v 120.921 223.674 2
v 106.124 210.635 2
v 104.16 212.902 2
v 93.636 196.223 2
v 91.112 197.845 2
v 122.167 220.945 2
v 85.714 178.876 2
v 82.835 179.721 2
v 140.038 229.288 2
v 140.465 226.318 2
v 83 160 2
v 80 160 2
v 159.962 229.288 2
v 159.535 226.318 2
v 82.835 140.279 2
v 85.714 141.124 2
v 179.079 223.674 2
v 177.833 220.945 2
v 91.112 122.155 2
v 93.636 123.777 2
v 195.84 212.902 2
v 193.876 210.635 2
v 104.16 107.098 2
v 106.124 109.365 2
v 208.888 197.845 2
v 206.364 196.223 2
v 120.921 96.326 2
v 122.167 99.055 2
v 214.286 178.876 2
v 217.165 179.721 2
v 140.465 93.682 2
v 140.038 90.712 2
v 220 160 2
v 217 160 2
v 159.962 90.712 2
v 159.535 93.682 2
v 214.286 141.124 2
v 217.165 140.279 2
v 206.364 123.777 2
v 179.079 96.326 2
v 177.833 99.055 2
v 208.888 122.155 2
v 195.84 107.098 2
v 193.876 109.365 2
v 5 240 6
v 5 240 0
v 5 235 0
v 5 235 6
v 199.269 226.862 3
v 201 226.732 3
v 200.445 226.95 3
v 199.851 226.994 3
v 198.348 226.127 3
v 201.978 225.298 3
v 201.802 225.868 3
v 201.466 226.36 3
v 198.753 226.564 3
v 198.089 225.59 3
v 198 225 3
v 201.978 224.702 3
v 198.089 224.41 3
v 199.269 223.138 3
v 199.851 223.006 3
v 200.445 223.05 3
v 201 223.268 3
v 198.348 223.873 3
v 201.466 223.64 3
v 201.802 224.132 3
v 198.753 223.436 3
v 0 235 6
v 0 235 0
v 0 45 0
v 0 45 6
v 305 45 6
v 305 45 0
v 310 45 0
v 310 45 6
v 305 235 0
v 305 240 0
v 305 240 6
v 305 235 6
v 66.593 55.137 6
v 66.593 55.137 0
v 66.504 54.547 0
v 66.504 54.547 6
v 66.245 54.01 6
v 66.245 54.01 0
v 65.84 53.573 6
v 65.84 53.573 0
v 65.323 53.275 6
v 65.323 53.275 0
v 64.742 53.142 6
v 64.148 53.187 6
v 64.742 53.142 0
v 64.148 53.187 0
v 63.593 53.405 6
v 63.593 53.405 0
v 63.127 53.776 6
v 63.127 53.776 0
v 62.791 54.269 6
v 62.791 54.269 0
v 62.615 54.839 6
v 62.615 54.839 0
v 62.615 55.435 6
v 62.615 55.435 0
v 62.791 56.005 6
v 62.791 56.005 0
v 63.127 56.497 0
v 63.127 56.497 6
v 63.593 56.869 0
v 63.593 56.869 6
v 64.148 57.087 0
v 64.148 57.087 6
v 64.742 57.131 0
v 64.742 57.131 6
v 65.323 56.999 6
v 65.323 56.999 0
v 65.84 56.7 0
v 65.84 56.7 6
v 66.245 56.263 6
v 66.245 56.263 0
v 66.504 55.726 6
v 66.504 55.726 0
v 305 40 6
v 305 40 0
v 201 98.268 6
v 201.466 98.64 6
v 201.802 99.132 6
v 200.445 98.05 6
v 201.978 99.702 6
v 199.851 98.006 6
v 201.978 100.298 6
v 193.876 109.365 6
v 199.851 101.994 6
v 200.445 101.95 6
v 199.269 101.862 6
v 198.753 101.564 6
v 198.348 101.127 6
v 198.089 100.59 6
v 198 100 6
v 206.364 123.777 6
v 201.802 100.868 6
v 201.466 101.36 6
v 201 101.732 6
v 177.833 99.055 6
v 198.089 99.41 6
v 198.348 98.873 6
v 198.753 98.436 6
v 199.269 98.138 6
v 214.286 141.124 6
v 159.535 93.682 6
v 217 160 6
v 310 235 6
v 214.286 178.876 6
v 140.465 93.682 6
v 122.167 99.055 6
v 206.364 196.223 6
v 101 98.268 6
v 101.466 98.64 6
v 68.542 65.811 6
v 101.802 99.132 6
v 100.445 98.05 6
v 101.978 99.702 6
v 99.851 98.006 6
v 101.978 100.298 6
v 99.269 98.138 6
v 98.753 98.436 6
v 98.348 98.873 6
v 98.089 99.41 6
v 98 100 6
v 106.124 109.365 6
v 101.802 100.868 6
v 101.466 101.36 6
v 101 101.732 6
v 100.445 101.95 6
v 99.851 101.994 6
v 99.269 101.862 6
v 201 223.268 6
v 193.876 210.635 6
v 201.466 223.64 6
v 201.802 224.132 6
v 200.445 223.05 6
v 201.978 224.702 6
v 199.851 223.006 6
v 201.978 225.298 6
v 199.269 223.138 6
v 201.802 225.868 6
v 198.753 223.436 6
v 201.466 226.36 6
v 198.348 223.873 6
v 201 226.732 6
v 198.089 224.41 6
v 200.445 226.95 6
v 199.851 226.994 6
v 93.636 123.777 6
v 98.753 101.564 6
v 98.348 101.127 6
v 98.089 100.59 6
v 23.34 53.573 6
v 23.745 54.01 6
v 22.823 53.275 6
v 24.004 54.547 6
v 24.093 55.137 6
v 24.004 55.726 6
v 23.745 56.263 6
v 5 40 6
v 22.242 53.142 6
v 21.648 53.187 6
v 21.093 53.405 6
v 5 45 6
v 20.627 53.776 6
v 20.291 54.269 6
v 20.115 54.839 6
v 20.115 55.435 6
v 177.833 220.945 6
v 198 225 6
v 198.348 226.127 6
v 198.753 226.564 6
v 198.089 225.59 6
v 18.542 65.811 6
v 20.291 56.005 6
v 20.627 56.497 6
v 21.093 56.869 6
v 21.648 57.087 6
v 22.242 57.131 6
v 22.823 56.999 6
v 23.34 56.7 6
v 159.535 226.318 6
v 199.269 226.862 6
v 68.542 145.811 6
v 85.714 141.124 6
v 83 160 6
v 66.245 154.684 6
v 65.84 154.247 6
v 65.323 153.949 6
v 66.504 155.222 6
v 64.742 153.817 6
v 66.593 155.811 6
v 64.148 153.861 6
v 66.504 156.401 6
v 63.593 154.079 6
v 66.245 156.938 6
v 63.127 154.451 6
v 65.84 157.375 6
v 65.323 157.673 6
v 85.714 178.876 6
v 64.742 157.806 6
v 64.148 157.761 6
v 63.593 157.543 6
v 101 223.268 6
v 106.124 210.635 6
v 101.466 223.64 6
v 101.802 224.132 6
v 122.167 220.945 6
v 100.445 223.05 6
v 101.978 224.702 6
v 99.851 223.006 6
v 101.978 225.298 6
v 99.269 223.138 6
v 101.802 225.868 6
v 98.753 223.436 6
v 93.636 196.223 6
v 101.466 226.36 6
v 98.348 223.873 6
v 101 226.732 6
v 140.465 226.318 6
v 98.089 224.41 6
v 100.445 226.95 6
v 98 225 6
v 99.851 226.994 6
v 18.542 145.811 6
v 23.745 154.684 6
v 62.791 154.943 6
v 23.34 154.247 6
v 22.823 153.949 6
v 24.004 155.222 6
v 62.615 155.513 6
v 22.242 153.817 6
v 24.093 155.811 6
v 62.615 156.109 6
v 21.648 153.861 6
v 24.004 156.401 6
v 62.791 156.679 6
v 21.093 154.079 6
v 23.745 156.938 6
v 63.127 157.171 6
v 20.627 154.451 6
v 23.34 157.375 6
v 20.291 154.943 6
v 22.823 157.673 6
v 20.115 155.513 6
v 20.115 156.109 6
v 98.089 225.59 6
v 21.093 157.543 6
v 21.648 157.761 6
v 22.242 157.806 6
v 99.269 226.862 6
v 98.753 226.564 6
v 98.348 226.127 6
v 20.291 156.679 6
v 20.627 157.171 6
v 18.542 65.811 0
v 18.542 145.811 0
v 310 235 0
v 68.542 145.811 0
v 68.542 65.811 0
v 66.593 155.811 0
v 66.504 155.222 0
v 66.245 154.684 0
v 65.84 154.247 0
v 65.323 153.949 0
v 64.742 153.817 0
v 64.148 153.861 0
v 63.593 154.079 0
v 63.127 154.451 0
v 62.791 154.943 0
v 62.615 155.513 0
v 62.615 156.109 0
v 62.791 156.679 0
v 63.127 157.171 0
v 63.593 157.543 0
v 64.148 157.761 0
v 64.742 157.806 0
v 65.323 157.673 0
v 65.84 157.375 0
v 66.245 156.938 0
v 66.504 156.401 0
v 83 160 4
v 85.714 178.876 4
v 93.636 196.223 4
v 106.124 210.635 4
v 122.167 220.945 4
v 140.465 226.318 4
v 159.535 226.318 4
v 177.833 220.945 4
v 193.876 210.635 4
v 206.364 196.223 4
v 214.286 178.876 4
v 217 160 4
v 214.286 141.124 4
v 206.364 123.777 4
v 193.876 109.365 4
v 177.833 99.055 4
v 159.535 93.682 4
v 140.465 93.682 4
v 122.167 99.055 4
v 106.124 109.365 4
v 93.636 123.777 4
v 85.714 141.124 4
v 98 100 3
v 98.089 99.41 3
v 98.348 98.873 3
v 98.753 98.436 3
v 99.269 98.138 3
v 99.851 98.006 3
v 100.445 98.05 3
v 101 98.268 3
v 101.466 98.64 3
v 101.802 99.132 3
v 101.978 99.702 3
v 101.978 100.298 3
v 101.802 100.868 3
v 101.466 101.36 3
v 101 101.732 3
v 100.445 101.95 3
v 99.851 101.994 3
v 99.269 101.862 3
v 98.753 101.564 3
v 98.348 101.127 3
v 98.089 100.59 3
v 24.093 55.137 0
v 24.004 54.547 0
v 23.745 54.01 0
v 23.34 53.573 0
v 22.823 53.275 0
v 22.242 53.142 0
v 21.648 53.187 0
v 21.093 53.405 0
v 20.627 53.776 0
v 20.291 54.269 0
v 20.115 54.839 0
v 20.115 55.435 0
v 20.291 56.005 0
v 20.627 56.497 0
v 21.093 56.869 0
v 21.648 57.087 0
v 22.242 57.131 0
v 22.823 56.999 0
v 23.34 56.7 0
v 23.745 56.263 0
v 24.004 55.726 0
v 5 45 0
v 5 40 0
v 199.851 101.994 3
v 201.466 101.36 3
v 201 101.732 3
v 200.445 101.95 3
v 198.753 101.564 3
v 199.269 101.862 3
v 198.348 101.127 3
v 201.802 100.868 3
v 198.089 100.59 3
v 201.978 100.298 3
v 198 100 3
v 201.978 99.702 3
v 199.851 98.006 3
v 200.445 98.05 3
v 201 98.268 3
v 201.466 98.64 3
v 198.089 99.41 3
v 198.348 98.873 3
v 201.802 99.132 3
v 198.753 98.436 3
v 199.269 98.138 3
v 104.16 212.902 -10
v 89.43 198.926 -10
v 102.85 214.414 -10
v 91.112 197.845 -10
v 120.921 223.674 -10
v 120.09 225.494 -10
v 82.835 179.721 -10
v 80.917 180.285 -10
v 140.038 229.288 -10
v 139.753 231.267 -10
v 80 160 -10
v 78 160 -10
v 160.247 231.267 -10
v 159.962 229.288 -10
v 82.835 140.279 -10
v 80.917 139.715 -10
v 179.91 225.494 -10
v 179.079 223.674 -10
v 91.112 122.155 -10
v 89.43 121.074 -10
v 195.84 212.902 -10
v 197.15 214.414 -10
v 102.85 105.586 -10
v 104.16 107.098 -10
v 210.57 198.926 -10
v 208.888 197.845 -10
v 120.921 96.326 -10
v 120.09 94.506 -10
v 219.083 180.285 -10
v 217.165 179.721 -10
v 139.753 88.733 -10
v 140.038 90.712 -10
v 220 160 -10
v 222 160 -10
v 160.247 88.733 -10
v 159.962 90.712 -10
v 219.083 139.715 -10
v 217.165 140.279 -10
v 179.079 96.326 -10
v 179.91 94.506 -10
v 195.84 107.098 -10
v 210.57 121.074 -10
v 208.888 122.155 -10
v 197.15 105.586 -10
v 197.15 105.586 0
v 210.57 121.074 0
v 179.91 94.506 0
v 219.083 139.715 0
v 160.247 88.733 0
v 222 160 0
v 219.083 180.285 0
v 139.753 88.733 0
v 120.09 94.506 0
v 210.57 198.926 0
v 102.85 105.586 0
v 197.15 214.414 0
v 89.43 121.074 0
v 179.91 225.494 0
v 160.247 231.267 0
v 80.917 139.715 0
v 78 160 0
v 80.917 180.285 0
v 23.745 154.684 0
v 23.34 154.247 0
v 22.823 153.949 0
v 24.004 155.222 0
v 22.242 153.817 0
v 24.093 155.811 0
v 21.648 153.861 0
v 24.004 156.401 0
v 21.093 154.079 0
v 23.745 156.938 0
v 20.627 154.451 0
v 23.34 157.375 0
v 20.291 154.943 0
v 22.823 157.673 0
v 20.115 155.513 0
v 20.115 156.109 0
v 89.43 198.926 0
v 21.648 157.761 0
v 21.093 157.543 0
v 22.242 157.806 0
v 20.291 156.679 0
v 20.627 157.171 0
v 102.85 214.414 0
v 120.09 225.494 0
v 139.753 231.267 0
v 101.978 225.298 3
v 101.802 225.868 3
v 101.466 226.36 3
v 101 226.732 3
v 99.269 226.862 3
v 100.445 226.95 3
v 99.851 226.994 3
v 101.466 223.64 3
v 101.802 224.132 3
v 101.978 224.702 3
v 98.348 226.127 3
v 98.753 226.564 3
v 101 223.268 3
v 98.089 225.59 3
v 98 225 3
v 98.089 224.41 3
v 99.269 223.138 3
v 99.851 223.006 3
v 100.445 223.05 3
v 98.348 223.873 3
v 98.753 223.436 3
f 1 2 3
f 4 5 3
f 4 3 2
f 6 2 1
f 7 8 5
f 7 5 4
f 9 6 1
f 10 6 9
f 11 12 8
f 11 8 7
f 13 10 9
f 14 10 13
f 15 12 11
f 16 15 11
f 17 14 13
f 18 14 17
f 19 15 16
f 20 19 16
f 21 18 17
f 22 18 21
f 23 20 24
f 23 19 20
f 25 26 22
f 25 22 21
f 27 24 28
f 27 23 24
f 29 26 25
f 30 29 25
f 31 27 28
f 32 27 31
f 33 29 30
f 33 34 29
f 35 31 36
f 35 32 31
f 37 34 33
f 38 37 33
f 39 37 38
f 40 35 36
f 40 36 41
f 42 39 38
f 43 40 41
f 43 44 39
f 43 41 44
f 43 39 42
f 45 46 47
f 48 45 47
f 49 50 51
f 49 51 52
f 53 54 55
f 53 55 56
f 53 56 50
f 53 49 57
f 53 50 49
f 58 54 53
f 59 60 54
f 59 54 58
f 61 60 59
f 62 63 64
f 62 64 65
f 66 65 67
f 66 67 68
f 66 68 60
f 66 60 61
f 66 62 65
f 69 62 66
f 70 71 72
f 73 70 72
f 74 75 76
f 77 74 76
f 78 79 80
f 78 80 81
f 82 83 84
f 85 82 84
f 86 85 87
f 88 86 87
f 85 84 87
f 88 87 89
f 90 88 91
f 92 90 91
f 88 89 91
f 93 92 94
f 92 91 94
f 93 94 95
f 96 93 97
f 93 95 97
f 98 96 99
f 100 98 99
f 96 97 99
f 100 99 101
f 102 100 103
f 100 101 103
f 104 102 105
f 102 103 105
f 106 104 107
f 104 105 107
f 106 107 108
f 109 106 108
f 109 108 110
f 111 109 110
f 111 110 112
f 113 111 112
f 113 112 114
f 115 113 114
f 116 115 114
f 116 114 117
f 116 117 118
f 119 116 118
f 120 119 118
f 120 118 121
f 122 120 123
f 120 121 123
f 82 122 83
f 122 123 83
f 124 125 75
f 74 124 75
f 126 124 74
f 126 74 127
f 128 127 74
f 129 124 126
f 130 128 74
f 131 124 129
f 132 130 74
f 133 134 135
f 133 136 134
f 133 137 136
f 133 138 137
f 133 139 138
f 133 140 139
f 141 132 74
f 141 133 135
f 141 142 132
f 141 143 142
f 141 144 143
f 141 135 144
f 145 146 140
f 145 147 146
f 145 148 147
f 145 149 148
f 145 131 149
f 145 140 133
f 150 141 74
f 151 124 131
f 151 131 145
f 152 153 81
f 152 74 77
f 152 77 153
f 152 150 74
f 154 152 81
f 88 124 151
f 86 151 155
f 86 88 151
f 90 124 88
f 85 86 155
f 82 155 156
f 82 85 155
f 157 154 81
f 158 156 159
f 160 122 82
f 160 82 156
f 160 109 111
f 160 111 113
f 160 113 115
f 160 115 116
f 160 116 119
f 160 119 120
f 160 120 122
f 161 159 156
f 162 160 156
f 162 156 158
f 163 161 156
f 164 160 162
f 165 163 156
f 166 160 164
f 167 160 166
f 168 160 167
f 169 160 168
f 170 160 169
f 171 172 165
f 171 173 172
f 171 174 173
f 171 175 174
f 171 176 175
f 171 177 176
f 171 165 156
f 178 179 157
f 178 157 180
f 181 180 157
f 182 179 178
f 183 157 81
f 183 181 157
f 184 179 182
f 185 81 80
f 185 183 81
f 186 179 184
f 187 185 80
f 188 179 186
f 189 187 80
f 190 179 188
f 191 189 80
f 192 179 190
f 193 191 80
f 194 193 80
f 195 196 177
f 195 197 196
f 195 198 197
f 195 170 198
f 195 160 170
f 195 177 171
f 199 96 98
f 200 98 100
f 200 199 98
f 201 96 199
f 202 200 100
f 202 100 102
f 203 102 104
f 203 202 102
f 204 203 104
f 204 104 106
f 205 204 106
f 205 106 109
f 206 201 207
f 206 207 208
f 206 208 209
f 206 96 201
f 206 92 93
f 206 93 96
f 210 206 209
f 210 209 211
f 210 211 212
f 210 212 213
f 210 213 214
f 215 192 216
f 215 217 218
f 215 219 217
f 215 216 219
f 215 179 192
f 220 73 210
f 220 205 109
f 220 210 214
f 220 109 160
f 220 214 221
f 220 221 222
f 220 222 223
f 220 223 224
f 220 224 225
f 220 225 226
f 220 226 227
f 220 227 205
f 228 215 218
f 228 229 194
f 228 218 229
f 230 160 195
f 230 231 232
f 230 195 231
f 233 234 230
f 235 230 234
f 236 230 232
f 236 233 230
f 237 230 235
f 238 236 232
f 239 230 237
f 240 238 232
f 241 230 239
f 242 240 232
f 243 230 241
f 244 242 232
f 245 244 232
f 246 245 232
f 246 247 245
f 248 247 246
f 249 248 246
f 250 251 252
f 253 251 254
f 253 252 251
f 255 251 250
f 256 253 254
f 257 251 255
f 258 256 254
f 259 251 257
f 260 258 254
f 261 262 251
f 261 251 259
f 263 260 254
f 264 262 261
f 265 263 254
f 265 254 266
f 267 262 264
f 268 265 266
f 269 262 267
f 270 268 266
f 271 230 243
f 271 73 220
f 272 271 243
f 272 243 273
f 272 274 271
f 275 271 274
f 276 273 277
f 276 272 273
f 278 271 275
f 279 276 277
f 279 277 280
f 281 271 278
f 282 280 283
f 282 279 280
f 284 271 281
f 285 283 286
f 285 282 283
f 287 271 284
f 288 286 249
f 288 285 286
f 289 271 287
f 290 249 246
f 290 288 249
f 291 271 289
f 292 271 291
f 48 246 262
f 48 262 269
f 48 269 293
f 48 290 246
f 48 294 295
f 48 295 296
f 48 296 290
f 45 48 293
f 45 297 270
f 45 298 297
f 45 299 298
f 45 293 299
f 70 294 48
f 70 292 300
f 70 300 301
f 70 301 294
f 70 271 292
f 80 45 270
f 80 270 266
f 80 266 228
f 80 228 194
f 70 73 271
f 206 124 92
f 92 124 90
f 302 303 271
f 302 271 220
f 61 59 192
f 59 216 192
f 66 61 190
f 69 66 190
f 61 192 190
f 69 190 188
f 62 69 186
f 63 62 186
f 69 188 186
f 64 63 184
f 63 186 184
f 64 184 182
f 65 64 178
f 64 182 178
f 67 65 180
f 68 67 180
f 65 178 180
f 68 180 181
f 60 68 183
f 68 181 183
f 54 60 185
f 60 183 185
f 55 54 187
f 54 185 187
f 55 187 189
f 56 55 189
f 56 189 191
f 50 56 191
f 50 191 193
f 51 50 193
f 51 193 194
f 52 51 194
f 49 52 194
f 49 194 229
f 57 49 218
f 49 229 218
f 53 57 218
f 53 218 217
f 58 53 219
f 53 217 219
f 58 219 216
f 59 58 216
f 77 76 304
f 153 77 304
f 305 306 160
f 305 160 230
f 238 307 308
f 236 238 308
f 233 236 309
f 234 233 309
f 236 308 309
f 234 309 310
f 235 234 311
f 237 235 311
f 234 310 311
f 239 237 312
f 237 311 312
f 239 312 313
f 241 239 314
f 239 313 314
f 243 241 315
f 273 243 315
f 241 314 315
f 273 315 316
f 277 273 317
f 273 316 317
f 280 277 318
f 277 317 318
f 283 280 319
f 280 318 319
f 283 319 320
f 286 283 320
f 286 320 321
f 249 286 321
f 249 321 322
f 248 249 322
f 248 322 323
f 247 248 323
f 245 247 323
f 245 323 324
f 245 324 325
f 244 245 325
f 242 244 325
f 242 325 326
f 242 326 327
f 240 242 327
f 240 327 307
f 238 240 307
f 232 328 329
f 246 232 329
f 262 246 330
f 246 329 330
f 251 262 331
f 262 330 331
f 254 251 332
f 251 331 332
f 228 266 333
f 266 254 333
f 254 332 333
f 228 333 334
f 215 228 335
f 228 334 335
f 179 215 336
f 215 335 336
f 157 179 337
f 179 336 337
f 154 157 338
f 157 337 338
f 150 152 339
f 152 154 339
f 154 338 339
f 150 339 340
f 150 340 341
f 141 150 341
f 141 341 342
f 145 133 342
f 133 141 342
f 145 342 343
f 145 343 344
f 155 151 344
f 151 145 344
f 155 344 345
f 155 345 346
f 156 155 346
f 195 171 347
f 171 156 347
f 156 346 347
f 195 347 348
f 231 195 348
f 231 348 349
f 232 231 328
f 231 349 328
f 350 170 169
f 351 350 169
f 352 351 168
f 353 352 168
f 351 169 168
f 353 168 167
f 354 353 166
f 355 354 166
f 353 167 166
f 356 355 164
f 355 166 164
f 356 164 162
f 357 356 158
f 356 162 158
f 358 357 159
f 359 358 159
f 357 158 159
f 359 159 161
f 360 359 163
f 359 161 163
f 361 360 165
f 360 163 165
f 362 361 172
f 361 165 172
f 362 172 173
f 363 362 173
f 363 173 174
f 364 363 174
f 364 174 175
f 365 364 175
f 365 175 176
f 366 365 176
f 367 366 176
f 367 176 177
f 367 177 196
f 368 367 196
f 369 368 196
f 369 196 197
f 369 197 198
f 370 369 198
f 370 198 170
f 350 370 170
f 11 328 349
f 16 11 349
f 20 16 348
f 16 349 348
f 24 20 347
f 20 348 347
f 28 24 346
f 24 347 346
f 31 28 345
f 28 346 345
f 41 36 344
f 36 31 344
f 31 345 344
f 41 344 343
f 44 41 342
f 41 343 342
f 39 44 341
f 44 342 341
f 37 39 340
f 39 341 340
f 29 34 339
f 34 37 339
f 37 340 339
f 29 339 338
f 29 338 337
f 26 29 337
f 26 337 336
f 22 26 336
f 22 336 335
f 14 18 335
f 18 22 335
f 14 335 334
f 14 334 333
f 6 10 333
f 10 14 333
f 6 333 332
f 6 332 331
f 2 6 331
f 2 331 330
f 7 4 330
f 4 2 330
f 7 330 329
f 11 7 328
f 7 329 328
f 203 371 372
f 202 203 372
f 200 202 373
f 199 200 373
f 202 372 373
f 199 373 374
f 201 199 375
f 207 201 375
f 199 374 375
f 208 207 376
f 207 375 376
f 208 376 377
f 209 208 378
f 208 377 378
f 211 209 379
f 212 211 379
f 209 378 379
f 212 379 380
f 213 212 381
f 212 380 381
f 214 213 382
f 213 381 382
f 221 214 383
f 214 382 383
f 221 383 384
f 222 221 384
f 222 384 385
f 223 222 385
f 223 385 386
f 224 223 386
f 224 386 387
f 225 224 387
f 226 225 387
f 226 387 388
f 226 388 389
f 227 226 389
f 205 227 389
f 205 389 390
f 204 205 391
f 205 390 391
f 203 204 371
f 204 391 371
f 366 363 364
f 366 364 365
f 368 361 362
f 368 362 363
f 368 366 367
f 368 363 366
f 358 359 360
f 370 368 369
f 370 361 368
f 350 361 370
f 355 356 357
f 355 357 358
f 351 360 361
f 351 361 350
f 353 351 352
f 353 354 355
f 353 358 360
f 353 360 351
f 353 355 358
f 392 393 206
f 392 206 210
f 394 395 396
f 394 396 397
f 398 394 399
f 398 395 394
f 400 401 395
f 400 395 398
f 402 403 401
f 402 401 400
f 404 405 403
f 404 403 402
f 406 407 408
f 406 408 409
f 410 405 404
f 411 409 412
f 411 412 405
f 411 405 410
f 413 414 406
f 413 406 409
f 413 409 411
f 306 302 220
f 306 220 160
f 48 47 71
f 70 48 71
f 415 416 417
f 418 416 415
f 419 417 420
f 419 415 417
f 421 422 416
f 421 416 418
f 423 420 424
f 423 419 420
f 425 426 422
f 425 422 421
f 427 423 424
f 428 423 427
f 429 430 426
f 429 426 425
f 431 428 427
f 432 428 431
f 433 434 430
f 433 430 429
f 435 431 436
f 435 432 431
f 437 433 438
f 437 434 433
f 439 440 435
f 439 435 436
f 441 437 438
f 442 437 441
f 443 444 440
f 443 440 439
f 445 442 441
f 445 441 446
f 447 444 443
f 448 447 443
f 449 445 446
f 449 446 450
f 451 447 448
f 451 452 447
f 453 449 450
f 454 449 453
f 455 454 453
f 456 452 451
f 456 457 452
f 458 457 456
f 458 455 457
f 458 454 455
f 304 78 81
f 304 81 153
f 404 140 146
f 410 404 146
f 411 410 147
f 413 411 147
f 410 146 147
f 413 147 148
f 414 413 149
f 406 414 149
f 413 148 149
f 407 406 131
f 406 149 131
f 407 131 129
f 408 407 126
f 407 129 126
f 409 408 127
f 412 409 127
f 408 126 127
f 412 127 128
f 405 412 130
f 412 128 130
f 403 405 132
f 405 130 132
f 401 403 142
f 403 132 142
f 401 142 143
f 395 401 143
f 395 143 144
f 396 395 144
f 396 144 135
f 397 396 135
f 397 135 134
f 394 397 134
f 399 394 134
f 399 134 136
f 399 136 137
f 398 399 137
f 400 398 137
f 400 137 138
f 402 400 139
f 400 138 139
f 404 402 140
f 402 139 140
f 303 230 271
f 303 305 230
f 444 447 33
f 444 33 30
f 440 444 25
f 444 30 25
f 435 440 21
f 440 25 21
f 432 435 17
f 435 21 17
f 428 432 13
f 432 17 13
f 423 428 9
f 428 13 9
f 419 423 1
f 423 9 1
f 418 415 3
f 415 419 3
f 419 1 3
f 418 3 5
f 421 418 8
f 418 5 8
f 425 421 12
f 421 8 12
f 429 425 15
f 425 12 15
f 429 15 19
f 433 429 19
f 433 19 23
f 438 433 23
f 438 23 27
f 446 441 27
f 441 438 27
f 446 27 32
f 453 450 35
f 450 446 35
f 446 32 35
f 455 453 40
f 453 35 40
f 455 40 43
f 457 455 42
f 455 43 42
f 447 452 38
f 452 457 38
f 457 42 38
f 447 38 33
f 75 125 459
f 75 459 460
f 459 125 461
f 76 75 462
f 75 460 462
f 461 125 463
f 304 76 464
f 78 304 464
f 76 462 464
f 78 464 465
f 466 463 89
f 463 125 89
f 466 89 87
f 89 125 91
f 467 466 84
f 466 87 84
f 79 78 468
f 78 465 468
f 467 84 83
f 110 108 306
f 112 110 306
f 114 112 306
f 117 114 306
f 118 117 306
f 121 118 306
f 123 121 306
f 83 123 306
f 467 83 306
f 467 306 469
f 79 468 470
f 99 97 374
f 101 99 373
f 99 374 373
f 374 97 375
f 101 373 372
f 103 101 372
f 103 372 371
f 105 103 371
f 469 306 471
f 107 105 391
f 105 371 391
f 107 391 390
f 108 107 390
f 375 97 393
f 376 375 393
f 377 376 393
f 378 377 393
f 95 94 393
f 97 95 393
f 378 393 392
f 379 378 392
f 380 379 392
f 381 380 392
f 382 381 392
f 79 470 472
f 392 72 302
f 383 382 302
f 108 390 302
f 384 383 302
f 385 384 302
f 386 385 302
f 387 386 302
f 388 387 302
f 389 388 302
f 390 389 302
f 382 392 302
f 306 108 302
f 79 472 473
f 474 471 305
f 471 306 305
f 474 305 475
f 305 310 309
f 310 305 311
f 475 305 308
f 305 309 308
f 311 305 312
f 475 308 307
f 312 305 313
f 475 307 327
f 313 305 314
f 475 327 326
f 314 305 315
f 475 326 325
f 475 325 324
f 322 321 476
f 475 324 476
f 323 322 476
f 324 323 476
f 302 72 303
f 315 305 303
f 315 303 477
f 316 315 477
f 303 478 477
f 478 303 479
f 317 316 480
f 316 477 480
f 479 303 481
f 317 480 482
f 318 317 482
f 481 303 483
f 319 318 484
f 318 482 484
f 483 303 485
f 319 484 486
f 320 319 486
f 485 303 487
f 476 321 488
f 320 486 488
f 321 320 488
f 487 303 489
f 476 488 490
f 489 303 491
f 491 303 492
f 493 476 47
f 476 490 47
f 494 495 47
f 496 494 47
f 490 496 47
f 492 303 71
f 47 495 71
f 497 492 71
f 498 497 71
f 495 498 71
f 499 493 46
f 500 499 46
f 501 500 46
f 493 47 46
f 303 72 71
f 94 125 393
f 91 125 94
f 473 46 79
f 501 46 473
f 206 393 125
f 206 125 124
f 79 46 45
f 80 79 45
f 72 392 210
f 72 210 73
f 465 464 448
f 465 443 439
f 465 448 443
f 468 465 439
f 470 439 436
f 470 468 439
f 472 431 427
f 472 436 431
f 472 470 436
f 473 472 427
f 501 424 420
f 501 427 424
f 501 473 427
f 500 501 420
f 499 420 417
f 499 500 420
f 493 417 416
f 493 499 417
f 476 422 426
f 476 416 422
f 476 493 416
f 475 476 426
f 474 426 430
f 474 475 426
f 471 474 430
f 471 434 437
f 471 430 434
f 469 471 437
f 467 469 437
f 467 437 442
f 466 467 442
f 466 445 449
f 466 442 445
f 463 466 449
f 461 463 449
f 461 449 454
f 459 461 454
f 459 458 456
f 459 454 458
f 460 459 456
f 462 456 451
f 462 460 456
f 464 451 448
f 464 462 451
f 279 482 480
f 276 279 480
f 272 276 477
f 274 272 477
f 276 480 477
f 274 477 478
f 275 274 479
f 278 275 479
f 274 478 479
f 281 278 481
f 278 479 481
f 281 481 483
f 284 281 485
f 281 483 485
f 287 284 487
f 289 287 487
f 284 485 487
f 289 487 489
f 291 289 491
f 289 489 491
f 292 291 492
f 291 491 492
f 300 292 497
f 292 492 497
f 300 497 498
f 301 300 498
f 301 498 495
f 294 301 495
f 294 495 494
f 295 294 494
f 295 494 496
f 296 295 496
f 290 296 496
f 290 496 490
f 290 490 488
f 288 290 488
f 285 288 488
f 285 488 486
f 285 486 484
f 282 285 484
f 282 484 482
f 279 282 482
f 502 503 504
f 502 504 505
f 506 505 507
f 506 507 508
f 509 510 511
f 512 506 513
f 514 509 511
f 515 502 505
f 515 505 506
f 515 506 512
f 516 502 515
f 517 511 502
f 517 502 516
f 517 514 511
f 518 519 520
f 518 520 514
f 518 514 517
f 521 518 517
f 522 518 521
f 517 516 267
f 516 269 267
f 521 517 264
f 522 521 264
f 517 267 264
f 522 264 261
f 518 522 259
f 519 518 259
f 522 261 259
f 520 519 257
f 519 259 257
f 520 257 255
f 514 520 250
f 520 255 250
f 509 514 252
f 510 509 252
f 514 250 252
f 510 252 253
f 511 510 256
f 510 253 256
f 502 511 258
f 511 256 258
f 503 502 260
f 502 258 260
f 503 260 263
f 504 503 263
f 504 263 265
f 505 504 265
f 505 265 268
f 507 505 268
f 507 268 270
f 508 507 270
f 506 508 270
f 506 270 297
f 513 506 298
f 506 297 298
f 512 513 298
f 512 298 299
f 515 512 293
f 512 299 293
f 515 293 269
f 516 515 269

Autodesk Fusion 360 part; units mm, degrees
sketch "Skizze1" plane through (0, 0, 0) normal (0, 0, 1) x (1, 0, 0)
  line L0 (0, 0) -> (240, 0)
  line L1 (240, 0) -> (240, 240)
  line L2 (240, 240) -> (0, 240)
  line L3 (0, 240) -> (0, 0)
  dimension "d1" = 240
  dimension "d2" = 240
extrude "Extrusion1" add sketch "Skizze1" along normal blind 6
sketch "Skizze2" plane through (0, 0, 6) normal (0, 0, 1) x (-1, 0, 0)
  line L0 (0, -240) -> (0, 0)
  line L1 (0, 0) -> (-240, 0)
  line L2 (-240, 0) -> (-240, -240)
  line L3 (-240, -240) -> (0, -240)
  circle A0 centre (-150, -160) radius 70
  dimension "d6" = 140
extrude "Extrusion2" cut sketch "Skizze2" against normal blind 2 contours A0
sketch "Skizze3" plane through (0, 0, 4) normal (0, 0, 1) x (-1, 0, 0)
  circle A0 centre (-150, -160) radius 70
  circle A1 centre (-150, -160) radius 67
  dimension "d9" = 134
extrude "Extrusion3" cut sketch "Skizze3" against normal blind 35 contours A1
extrude "Extrusion4" add 1 faces at (208.7542, 124.1511, 4) along direction (0, 0, 1) blind 2
sketch "Skizze4" plane through (0, 0, 0) normal (0, 0, -1) x (1, 0, 0)
  circle A0 centre (150, -160) radius 67
  line L0 (0, 0) -> (0, -240)
  line L1 (0, -240) -> (240, -240)
  line L2 (240, -240) -> (240, 0)
  line L3 (240, 0) -> (0, 0)
  circle A1 centre (150, -160) radius 70
  dimension "d14" = 140
extrude "Extrusion5" cut sketch "Skizze4" against normal blind 2 contours A1
extrude "Extrusion6" cut 1 faces at (80, 0, 2) along direction (0, 1, 0) blind 40
sketch "Skizze5" plane through (0, 0, 0) normal (0, 0, -1) x (1, 0, 0)
  line L0 (240, -40) -> (0, -40)
  line L1 (0, -40) -> (0, -240)
  line L2 (0, -240) -> (240, -240)
  line L3 (240, -240) -> (240, -40)
  circle A0 centre (150, -160) radius 70
  circle A1 centre (150, -160) radius 70
  circle A2 centre (150, -160) radius 72
  dimension "d19" = 144
extrude "Extrusion7" add sketch "Skizze5" along normal blind 10 contours A2
extrude "Extrusion8" add 1 faces at (240, 106.6667, 4) along direction (1, 0, 0) blind 70
sketch "Skizze6" plane through (0, 0, 0) normal (0, 0, -1) x (1, 0, 0)
  circle A0 centre (150, -160) radius 72
  line L0 (310, -40) -> (0, -40)
  line L1 (0, -40) -> (0, -240)
  line L2 (0, -240) -> (310, -240)
  line L3 (310, -240) -> (310, -40)
  line L4 (0, -40) -> (5, -40)
  line L5 (5, -40) -> (5, -45)
  line L6 (5, -45) -> (0, -45)
  line L7 (0, -45) -> (0, -40)
  line L8 (0, -240) -> (5, -240)
  line L9 (5, -240) -> (5, -235)
  line L10 (5, -235) -> (0, -235)
  line L11 (0, -235) -> (0, -240)
  line L12 (310, -240) -> (305, -240)
  line L13 (305, -240) -> (305, -235)
  line L14 (305, -235) -> (310, -235)
  line L15 (310, -235) -> (310, -240)
  line L16 (310, -40) -> (305, -40)
  line L17 (305, -40) -> (305, -45)
  line L18 (305, -45) -> (310, -45)
  line L19 (310, -45) -> (310, -40)
  dimension "d24" = 5
  dimension "d25" = 5
extrude "Extrusion9" cut sketch "Skizze6" against normal blind 20 contours L0 L3 L16 L17 L18 L19 | L0 L1 L4 L5 L6 L7 | L2 L3 L12 L13 L14 L15 | L1 L2 L8 L9 L10 L11
sketch "Skizze7" plane through (0, 0, 0) normal (0, 0, -1) x (1, 0, 0)
  circle A0 centre (150, -160) radius 72
  line L0 (305, -240) -> (305, -235)
  line L1 (305, -235) -> (310, -235)
  line L2 (310, -235) -> (310, -45)
  line L3 (310, -45) -> (305, -45)
  line L4 (305, -45) -> (305, -40)
  line L5 (305, -40) -> (5, -40)
  line L6 (5, -40) -> (5, -45)
  line L7 (5, -45) -> (0, -45)
  line L8 (0, -45) -> (0, -235)
  line L9 (0, -235) -> (5, -235)
  line L10 (5, -235) -> (5, -240)
  line L11 (5, -240) -> (305, -240)
  line L12 (18.5416, -65.8113) -> (68.5416, -65.8113)
  line L13 (68.5416, -65.8113) -> (68.5416, -145.8113)
  line L14 (68.5416, -145.8113) -> (18.5416, -145.8113)
  line L15 (18.5416, -145.8113) -> (18.5416, -65.8113)
  circle A1 centre (64.5928, -155.8111) radius 2
  circle A2 centre (22.0928, -155.8111) radius 2
  circle A3 centre (64.5928, -55.1368) radius 2
  circle A4 centre (22.0928, -55.1368) radius 2
  dimension "d28" = 80
  dimension "d29" = 42.5
  dimension "d30" = 4
  dimension "d31" = 4
  dimension "d32" = 4
  dimension "d33" = 4
extrude "Extrusion10" cut sketch "Skizze7" against normal blind 90 contours L12 L13 L14 L15 | A1 | A2 | A3 | A4
sketch "Skizze8" plane through (0, 0, 6) normal (0, 0, 1) x (-1, 0, 0)
  line L0 (-68.5416, -145.8113) -> (-68.5416, -65.8113)
  line L1 (-68.5416, -65.8113) -> (-18.5416, -65.8113)
  line L2 (-18.5416, -65.8113) -> (-18.5416, -145.8113)
  line L3 (-18.5416, -145.8113) -> (-68.5416, -145.8113)
  circle A0 centre (-64.5928, -155.8111) radius 2
  circle A1 centre (-64.5928, -55.1368) radius 2
  circle A2 centre (-22.0928, -155.8111) radius 2
  circle A3 centre (-22.0928, -55.1368) radius 2
  circle A4 centre (-150, -160) radius 67
  line L4 (-310, -235) -> (-305, -235)
  line L5 (-305, -235) -> (-305, -240)
  line L6 (-305, -240) -> (-5, -240)
  line L7 (-5, -240) -> (-5, -235)
  line L8 (-5, -235) -> (0, -235)
  line L9 (0, -235) -> (0, -45)
  line L10 (0, -45) -> (-5, -45)
  line L11 (-5, -45) -> (-5, -40)
  line L12 (-5, -40) -> (-305, -40)
  line L13 (-305, -40) -> (-305, -45)
  line L14 (-305, -45) -> (-310, -45)
  line L15 (-310, -45) -> (-310, -235)
  circle A5 centre (-100, -225) radius 2
  circle A6 centre (-200, -225) radius 2
  circle A7 centre (-200, -100) radius 2
  circle A8 centre (-100, -100) radius 2
  dimension "d36" = 4
  dimension "d37" = 4
  dimension "d38" = 4
  dimension "d39" = 4
extrude "Extrusion11" cut sketch "Skizze8" against normal blind 3 contours A5 | A6 | A7 | A8
